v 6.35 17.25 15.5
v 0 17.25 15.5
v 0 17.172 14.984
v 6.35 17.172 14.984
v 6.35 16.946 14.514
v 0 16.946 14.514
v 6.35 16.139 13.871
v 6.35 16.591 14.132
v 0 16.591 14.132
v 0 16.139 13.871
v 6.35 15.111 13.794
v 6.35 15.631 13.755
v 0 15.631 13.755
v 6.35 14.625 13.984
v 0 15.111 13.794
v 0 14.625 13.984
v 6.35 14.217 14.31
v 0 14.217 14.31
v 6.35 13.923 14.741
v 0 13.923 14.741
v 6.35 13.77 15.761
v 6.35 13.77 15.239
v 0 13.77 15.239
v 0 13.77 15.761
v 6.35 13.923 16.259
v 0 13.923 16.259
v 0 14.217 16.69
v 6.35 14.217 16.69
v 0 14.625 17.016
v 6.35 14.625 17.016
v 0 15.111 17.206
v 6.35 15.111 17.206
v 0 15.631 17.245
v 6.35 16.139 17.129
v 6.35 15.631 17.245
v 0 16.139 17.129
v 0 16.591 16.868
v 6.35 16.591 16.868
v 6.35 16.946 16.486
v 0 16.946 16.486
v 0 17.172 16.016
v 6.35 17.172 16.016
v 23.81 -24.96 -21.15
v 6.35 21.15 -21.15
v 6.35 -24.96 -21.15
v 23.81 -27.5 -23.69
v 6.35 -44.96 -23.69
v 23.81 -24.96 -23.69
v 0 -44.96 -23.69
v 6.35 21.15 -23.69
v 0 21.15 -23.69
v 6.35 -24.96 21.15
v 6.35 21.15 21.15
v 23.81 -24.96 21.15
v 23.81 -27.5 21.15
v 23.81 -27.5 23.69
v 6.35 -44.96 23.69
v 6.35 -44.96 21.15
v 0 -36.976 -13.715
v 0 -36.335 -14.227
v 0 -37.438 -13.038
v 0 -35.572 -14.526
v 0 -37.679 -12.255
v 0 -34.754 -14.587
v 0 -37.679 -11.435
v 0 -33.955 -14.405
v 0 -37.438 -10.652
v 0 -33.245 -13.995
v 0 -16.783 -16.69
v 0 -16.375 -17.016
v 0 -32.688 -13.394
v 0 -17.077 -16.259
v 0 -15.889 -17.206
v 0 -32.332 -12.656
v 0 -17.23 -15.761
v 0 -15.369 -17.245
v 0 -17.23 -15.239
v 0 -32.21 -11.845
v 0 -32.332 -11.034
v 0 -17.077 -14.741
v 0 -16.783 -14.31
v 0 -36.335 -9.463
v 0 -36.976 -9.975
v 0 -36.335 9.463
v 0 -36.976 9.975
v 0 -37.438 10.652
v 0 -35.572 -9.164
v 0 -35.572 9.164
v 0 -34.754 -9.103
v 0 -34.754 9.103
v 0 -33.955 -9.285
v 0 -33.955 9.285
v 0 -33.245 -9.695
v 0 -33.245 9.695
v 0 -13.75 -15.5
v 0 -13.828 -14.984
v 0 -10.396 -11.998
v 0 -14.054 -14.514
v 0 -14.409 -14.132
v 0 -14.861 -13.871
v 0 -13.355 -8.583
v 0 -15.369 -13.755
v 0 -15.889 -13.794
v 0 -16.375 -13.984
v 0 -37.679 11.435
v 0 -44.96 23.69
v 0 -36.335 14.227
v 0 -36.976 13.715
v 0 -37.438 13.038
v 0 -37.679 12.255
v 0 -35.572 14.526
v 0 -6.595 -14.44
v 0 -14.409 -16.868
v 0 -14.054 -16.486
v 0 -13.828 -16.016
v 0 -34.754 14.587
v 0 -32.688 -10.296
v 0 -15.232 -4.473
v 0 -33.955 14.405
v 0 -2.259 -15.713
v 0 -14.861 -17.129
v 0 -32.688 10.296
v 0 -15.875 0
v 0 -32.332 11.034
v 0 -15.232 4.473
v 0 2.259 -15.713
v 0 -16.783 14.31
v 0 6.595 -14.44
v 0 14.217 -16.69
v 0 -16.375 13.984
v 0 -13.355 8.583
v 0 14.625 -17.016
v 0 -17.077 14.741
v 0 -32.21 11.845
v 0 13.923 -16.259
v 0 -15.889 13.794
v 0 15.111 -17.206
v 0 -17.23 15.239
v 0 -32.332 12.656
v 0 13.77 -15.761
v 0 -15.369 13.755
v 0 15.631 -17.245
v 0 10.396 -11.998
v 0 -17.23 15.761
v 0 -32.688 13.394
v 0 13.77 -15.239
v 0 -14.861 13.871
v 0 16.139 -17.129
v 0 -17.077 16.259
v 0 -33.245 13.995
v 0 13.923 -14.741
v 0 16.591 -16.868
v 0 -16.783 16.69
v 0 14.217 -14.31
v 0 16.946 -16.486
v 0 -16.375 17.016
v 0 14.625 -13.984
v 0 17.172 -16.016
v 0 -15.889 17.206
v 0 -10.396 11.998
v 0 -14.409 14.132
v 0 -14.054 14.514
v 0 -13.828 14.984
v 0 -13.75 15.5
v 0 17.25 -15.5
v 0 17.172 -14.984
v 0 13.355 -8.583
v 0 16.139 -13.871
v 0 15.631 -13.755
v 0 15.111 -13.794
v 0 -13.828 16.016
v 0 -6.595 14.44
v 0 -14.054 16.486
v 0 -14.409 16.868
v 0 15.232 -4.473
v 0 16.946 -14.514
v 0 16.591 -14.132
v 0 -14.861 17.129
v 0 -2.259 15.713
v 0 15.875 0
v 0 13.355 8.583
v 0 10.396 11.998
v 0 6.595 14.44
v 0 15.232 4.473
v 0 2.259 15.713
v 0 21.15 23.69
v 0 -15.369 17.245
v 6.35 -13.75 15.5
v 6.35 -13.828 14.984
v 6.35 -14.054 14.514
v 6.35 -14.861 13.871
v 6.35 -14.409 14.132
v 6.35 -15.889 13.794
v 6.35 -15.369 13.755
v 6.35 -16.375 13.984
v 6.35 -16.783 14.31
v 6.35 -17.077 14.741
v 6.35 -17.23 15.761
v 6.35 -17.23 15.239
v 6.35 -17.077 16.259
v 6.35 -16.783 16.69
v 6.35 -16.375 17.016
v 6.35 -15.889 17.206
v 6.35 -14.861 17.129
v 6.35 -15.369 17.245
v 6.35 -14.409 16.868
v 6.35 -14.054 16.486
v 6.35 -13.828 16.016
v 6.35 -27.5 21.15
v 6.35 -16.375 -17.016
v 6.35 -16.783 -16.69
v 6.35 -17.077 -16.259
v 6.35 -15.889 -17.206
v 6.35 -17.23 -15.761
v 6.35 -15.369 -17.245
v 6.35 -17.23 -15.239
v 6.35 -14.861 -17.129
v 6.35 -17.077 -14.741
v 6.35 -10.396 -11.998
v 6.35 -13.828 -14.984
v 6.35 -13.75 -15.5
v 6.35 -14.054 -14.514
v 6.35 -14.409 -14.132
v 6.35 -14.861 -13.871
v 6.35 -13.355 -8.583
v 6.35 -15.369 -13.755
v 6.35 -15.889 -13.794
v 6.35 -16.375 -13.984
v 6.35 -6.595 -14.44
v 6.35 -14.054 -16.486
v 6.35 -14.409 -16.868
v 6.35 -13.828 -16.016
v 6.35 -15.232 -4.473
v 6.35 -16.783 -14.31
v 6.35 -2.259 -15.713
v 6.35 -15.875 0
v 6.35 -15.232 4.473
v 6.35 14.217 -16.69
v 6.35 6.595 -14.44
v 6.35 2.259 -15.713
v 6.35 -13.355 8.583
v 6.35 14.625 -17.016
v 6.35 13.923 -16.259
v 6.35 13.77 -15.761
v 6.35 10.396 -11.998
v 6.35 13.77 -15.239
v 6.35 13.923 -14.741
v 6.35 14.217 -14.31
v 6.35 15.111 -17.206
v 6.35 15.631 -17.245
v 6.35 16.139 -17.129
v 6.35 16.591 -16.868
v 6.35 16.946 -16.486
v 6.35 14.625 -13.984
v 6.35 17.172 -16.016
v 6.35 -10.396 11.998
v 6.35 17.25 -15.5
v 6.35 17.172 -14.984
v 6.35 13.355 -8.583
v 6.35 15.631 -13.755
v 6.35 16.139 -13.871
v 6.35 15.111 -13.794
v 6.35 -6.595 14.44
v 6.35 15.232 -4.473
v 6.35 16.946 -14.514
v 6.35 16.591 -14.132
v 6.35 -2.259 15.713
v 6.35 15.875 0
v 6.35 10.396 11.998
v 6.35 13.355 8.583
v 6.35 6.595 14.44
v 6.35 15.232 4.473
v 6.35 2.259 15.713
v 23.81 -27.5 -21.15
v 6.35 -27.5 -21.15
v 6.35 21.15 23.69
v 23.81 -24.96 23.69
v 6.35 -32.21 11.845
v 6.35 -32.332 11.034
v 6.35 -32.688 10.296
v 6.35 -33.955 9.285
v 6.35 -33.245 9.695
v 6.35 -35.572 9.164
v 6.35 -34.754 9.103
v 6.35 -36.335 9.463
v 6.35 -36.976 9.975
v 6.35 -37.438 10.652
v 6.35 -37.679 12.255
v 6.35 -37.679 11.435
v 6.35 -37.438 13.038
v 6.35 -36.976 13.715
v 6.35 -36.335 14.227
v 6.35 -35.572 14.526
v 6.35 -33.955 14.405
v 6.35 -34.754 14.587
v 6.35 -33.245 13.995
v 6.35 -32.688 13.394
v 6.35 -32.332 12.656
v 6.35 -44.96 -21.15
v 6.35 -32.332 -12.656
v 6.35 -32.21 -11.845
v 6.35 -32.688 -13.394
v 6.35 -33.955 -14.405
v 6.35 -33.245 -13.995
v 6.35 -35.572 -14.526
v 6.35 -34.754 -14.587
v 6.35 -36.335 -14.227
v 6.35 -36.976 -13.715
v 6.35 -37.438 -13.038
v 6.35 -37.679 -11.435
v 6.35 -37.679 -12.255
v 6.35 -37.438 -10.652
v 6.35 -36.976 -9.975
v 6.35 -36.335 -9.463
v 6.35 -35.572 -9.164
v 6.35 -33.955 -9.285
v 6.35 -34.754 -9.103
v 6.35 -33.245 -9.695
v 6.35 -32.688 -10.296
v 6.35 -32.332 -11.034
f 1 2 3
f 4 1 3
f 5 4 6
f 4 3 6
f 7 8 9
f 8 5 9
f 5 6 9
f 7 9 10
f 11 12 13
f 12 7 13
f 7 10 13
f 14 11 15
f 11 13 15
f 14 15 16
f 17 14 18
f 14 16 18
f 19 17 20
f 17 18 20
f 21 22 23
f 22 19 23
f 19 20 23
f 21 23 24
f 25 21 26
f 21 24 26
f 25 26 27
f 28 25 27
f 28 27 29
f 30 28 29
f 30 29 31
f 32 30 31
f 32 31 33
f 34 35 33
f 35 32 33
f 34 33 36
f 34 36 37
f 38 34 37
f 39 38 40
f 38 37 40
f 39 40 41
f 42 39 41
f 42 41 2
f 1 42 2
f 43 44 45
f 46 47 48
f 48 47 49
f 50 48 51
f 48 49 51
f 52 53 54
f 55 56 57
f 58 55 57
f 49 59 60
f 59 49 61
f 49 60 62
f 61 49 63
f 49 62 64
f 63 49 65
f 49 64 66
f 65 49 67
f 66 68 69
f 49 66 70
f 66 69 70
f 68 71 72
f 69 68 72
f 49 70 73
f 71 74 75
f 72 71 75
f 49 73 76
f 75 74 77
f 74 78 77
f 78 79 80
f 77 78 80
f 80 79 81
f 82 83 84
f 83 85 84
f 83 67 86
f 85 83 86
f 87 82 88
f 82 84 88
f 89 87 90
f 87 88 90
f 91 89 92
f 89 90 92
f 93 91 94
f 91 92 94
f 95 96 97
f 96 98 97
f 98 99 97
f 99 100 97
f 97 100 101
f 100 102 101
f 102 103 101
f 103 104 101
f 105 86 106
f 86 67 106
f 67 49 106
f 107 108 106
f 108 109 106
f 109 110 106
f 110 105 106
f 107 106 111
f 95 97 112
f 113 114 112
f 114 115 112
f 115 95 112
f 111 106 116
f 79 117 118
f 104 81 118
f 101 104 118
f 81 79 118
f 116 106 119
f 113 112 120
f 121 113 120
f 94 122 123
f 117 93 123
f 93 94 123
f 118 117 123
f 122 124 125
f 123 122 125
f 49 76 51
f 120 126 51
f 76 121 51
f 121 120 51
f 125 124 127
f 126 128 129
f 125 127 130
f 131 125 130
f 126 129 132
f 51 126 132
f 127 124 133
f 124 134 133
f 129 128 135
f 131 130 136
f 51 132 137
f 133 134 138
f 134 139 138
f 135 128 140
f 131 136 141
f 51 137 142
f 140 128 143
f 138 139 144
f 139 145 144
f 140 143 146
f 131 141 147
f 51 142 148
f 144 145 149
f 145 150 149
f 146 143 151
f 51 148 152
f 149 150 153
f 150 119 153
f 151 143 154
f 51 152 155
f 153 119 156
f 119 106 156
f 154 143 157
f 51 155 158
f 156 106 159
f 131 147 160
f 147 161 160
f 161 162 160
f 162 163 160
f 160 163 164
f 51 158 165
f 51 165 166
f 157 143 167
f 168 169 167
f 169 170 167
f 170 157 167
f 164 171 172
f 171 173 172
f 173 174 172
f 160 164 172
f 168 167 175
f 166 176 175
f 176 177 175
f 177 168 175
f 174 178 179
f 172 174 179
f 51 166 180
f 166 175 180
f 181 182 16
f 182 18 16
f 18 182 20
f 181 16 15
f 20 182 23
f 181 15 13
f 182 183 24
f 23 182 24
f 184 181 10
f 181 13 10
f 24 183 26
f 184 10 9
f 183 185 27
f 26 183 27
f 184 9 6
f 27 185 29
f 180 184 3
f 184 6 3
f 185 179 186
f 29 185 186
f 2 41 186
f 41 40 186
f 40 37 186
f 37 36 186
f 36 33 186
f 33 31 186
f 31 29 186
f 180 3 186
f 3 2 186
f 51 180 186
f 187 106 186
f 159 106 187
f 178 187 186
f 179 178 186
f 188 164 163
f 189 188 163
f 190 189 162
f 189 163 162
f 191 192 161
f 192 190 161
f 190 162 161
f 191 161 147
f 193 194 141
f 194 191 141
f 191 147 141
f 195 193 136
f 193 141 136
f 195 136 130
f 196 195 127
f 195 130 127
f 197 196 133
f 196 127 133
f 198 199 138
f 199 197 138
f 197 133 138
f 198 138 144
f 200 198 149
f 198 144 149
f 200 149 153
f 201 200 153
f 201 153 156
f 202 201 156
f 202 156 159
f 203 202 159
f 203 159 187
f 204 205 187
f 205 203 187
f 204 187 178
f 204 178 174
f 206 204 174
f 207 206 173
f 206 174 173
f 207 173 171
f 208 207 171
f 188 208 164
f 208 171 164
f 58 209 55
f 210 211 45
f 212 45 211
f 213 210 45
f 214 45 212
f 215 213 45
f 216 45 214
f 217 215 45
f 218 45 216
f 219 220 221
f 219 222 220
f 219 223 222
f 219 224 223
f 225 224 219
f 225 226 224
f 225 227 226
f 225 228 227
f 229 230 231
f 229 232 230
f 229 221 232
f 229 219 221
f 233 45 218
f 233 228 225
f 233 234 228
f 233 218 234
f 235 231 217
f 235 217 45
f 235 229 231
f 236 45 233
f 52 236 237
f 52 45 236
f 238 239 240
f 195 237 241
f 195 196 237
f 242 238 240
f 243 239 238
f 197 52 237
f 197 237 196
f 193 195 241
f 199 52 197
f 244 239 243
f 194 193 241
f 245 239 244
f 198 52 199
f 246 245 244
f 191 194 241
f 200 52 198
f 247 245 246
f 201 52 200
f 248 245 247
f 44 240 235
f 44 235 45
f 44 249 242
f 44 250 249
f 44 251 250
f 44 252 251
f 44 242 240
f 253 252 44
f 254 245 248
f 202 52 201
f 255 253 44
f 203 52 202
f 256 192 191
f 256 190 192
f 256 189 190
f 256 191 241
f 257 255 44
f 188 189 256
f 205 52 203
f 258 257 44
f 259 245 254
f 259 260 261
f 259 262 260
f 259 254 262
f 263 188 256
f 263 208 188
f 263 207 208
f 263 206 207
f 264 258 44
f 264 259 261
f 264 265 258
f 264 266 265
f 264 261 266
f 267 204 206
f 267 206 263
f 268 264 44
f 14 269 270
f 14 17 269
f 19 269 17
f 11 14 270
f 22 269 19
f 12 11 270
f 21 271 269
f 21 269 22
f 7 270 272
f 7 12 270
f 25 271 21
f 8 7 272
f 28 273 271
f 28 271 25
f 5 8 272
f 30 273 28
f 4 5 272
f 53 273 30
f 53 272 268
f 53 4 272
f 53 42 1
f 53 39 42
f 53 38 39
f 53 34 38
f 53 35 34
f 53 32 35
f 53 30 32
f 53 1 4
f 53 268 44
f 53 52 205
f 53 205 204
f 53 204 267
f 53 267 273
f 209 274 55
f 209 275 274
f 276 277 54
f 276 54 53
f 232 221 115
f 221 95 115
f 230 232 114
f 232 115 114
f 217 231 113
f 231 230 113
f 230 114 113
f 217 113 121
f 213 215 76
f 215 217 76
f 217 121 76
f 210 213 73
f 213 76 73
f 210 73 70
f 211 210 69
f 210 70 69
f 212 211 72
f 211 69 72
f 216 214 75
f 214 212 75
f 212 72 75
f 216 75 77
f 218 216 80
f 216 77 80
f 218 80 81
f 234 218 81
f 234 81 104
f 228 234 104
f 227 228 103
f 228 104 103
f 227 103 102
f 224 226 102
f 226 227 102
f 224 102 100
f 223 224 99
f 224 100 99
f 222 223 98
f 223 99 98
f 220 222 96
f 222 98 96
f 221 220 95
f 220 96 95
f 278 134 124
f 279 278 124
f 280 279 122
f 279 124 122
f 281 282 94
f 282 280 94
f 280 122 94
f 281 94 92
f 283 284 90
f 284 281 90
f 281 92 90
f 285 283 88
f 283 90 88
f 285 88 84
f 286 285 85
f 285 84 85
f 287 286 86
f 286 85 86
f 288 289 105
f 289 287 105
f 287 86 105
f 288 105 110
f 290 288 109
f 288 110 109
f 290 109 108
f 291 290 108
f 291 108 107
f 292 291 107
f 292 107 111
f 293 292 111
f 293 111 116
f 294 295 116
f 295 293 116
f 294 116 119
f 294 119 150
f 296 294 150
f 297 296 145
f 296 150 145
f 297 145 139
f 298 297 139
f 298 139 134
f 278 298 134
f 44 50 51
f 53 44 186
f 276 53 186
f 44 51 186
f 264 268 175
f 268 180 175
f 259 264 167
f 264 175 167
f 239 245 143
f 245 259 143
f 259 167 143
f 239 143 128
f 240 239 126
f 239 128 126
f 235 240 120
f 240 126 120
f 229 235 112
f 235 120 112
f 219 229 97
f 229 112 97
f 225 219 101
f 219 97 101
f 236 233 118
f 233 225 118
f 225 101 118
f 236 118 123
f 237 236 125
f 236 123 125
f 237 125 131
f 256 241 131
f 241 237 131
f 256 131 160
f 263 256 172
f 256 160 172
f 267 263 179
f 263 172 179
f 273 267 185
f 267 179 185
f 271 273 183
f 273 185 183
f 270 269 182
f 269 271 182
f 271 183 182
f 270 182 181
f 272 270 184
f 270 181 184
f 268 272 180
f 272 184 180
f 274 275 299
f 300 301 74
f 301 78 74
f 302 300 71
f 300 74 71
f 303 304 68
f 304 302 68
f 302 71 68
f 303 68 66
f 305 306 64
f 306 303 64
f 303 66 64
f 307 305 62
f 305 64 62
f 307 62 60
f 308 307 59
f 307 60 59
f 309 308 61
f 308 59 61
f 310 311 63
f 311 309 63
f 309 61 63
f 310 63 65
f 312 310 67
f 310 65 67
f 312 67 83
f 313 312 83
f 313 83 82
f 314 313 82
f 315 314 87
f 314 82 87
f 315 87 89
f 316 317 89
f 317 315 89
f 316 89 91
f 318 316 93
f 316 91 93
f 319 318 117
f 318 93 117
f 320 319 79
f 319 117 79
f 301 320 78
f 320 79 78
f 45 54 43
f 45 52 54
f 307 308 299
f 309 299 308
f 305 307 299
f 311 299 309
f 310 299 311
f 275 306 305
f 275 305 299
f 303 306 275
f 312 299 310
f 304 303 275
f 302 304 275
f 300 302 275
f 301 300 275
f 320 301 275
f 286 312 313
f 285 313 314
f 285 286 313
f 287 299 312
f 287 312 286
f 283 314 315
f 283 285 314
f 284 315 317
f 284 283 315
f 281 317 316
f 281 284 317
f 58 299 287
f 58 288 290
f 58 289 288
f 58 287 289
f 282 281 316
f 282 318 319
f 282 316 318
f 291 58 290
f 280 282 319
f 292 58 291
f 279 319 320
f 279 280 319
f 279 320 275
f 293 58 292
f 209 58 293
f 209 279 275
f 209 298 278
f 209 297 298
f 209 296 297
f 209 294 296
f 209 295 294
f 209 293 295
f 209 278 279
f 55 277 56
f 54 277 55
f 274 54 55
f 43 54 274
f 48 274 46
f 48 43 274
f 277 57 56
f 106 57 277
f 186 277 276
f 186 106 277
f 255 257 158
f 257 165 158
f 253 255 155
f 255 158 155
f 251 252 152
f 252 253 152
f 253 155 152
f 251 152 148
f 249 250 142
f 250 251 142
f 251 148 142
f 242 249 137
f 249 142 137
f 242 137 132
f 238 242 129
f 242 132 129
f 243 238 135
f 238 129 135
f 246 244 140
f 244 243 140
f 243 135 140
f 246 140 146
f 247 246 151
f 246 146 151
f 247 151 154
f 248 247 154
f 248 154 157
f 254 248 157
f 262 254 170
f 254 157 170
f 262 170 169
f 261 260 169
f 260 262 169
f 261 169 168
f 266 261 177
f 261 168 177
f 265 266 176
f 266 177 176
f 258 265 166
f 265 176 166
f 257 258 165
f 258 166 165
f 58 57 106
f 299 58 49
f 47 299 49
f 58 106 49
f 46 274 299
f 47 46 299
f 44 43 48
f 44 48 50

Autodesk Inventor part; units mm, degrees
ref_plane "YZ Plane" through (0, 0, 0) normal (1, 0, 0) x (0, 1, 0)
ref_plane "XZ Plane" through (0, 0, 0) normal (0, 1, 0) x (-1, 0, 0)
ref_plane "XY Plane" through (0, 0, 0) normal (0, 0, 1) x (1, 0, 0)
sketch "Sketch2" plane through (0, 0, 0) normal (1, 0, 0) x (0, 1, 0)
  line L0 (-15.5, 15.5) -> (15.5, 15.5) construction
  line L1 (15.5, 15.5) -> (15.5, -15.5) construction
  line L2 (15.5, -15.5) -> (-15.5, -15.5) construction
  line L3 (-15.5, -15.5) -> (-15.5, 15.5) construction
  line L4 (-15.5, 15.5) -> (15.5, -15.5) construction
  line L5 (15.5, 15.5) -> (-15.5, -15.5) construction
  circle A0 centre (15.5, 15.5) radius 1.75
  circle A1 centre (15.5, -15.5) radius 1.75
  circle A2 centre (-15.5, -15.5) radius 1.75
  line L6 (-21.15, 21.15) -> (21.15, 21.15) construction
  line L7 (21.15, -21.15) -> (-21.15, -21.15) construction
  line L8 (-21.15, -21.15) -> (-21.15, 21.15) construction
  line L9 (-21.15, 21.15) -> (21.15, -21.15) construction
  line L10 (21.15, 21.15) -> (-21.15, -21.15) construction
  circle A3 centre (-15.5, 15.5) radius 1.75
  line L11 (21.15, 21.15) -> (-21.15, 21.15) construction
  line L12 (-21.15, 23.69) -> (21.15, 23.69)
  line L13 (21.15, -21.15) -> (-21.15, -21.15) construction
  line L14 (-21.15, -21.15) -> (-21.15, -23.69) construction
  line L15 (-21.15, -23.69) -> (21.15, -23.69)
  line L16 (-21.15, 21.15) -> (-44.96, 21.15) construction
  line L17 (-44.96, 21.15) -> (-44.96, -21.15)
  line L18 (-44.96, -21.15) -> (-21.15, -21.15) construction
  line L19 (-21.15, -21.15) -> (-21.15, 21.15) construction
  line L20 (-44.96, 21.15) -> (-20.6909, 21.15) construction
  line L21 (-44.96, -21.15) -> (-21.15, -21.15) construction
  line L22 (-34.96, 0.6795) -> (-34.96, -24.3695) construction
  line L23 (-34.96, 0.6795) -> (-34.96, 23.0105) construction
  circle A4 centre (-34.96, 11.845) radius 2.75
  circle A5 centre (-34.96, -11.845) radius 2.75
  circle A6 centre (0, 0) radius 15.875
  line L24 (-21.15, -23.69) -> (-24.96, -23.69)
  line L25 (-24.96, -23.69) -> (-24.96, 23.69) construction
  line L26 (-24.96, 23.69) -> (-21.15, 23.69)
  line L27 (-21.15, 23.69) -> (-21.15, -23.69) construction
  line L28 (21.15, -23.69) -> (21.15, 23.69)
  line L29 (21.15, -23.69) -> (-24.96, -23.69)
  line L30 (-24.96, -23.69) -> (-24.96, 23.69)
  line L31 (-24.96, 23.69) -> (21.15, 23.69)
  line L32 (21.15, 23.69) -> (21.15, -23.69)
  line L33 (-24.96, 23.69) -> (-44.96, 23.69)
  line L34 (-44.96, 23.69) -> (-44.96, -23.69)
  line L35 (-44.96, -23.69) -> (-24.96, -23.69)
  line L36 (-24.96, -23.69) -> (-24.96, 23.69)
  dimension "d19" = 31
  dimension "d20" = 3.5
  dimension "d21" = 42.3
  dimension "d24" = 5.5
  dimension "d35" = 31.75
  dimension "d36" = 23.69
  dimension "d38" = 20
  dimension "d39" = 42.3
  dimension "d40" = 3.81
  dimension "d41" = 10
  dimension "d42" = 2.54
  dimension "d43" = 42.3
extrude "Extrusion2" add sketch "Sketch2" along normal blind 6.35
sketch "Sketch3" plane through (6.35, 0, 0) normal (1, 0, 0) x (0, 0, -1)
  line L0 (-23.69, 21.15) -> (-23.69, -41.15) projected
  line L1 (-21.15, -44.96) -> (21.15, -44.96) projected
  line L2 (-23.69, 21.15) -> (-21.15, 21.15)
  line L3 (-21.15, 21.15) -> (-21.15, -44.96)
  line L4 (-21.15, -44.96) -> (-23.69, -44.96)
  line L5 (-23.69, -44.96) -> (-23.69, 21.15)
  line L6 (23.69, -24.96) -> (23.69, 21.15) projected
  line L7 (23.69, 21.15) -> (21.15, 21.15)
  line L8 (21.15, 21.15) -> (21.15, -44.96)
  line L9 (21.15, -44.96) -> (23.69, -44.96)
  line L10 (23.69, -44.96) -> (23.69, 21.15)
  line L11 (23.69, -27.5) -> (-23.69, -27.5)
  line L12 (-23.69, -27.5) -> (-23.69, -24.96)
  line L13 (-23.69, -24.96) -> (23.69, -24.96)
  line L14 (23.69, -24.96) -> (23.69, -27.5)
  point P0 (0, 0)
  point P1 (23.69, -41.15)
  dimension "d27" = 2.54
  dimension "d28" = 2.54
  dimension "d29" = 2.54
  dimension "d30" = 20
extrude "Extrusion3" add sketch "Sketch3" along normal blind 17.46 contours L2 L3 L13 L0 | L13 L3 L11 L0 | L11 L3 L4 L5 L0 | L13 L8 L11 L3 | L13 L10 L11 L8 | L8 L7 L6 L13 | L11 L10 L9 L8
sketch "Sketch5" plane through (0, -44.96, 23.69) normal (0, 0, 1) x (1, 0, 0)
  line L0 (23.81, 20) -> (6.35, 20) projected
  line L1 (23.81, 66.11) -> (23.81, 20) projected
  line L2 (6.35, 66.11) -> (23.81, 66.11) projected
  line L3 (6.35, 20) -> (6.35, 66.11) projected
  line L4 (6.35, 17.46) -> (23.81, 17.46) projected
  line L5 (6.35, 0) -> (6.35, 17.46) projected
  line L6 (6.35, 0) -> (23.81, 0) projected
  line L7 (23.81, 17.46) -> (23.81, 0) projected
  line L8 (6.35, 0) -> (6.35, 17.46) projected
  line L9 (23.81, 17.46) -> (6.35, 0)
  line L10 (23.81, 20) -> (6.35, 66.11)
  point P0 (0, 44.96)
extrude "Extrusion5" cut sketch "Sketch5" against normal through all contours L10 L2 L1 | L7 L6 L9
properties part number "nemaMountStock"
